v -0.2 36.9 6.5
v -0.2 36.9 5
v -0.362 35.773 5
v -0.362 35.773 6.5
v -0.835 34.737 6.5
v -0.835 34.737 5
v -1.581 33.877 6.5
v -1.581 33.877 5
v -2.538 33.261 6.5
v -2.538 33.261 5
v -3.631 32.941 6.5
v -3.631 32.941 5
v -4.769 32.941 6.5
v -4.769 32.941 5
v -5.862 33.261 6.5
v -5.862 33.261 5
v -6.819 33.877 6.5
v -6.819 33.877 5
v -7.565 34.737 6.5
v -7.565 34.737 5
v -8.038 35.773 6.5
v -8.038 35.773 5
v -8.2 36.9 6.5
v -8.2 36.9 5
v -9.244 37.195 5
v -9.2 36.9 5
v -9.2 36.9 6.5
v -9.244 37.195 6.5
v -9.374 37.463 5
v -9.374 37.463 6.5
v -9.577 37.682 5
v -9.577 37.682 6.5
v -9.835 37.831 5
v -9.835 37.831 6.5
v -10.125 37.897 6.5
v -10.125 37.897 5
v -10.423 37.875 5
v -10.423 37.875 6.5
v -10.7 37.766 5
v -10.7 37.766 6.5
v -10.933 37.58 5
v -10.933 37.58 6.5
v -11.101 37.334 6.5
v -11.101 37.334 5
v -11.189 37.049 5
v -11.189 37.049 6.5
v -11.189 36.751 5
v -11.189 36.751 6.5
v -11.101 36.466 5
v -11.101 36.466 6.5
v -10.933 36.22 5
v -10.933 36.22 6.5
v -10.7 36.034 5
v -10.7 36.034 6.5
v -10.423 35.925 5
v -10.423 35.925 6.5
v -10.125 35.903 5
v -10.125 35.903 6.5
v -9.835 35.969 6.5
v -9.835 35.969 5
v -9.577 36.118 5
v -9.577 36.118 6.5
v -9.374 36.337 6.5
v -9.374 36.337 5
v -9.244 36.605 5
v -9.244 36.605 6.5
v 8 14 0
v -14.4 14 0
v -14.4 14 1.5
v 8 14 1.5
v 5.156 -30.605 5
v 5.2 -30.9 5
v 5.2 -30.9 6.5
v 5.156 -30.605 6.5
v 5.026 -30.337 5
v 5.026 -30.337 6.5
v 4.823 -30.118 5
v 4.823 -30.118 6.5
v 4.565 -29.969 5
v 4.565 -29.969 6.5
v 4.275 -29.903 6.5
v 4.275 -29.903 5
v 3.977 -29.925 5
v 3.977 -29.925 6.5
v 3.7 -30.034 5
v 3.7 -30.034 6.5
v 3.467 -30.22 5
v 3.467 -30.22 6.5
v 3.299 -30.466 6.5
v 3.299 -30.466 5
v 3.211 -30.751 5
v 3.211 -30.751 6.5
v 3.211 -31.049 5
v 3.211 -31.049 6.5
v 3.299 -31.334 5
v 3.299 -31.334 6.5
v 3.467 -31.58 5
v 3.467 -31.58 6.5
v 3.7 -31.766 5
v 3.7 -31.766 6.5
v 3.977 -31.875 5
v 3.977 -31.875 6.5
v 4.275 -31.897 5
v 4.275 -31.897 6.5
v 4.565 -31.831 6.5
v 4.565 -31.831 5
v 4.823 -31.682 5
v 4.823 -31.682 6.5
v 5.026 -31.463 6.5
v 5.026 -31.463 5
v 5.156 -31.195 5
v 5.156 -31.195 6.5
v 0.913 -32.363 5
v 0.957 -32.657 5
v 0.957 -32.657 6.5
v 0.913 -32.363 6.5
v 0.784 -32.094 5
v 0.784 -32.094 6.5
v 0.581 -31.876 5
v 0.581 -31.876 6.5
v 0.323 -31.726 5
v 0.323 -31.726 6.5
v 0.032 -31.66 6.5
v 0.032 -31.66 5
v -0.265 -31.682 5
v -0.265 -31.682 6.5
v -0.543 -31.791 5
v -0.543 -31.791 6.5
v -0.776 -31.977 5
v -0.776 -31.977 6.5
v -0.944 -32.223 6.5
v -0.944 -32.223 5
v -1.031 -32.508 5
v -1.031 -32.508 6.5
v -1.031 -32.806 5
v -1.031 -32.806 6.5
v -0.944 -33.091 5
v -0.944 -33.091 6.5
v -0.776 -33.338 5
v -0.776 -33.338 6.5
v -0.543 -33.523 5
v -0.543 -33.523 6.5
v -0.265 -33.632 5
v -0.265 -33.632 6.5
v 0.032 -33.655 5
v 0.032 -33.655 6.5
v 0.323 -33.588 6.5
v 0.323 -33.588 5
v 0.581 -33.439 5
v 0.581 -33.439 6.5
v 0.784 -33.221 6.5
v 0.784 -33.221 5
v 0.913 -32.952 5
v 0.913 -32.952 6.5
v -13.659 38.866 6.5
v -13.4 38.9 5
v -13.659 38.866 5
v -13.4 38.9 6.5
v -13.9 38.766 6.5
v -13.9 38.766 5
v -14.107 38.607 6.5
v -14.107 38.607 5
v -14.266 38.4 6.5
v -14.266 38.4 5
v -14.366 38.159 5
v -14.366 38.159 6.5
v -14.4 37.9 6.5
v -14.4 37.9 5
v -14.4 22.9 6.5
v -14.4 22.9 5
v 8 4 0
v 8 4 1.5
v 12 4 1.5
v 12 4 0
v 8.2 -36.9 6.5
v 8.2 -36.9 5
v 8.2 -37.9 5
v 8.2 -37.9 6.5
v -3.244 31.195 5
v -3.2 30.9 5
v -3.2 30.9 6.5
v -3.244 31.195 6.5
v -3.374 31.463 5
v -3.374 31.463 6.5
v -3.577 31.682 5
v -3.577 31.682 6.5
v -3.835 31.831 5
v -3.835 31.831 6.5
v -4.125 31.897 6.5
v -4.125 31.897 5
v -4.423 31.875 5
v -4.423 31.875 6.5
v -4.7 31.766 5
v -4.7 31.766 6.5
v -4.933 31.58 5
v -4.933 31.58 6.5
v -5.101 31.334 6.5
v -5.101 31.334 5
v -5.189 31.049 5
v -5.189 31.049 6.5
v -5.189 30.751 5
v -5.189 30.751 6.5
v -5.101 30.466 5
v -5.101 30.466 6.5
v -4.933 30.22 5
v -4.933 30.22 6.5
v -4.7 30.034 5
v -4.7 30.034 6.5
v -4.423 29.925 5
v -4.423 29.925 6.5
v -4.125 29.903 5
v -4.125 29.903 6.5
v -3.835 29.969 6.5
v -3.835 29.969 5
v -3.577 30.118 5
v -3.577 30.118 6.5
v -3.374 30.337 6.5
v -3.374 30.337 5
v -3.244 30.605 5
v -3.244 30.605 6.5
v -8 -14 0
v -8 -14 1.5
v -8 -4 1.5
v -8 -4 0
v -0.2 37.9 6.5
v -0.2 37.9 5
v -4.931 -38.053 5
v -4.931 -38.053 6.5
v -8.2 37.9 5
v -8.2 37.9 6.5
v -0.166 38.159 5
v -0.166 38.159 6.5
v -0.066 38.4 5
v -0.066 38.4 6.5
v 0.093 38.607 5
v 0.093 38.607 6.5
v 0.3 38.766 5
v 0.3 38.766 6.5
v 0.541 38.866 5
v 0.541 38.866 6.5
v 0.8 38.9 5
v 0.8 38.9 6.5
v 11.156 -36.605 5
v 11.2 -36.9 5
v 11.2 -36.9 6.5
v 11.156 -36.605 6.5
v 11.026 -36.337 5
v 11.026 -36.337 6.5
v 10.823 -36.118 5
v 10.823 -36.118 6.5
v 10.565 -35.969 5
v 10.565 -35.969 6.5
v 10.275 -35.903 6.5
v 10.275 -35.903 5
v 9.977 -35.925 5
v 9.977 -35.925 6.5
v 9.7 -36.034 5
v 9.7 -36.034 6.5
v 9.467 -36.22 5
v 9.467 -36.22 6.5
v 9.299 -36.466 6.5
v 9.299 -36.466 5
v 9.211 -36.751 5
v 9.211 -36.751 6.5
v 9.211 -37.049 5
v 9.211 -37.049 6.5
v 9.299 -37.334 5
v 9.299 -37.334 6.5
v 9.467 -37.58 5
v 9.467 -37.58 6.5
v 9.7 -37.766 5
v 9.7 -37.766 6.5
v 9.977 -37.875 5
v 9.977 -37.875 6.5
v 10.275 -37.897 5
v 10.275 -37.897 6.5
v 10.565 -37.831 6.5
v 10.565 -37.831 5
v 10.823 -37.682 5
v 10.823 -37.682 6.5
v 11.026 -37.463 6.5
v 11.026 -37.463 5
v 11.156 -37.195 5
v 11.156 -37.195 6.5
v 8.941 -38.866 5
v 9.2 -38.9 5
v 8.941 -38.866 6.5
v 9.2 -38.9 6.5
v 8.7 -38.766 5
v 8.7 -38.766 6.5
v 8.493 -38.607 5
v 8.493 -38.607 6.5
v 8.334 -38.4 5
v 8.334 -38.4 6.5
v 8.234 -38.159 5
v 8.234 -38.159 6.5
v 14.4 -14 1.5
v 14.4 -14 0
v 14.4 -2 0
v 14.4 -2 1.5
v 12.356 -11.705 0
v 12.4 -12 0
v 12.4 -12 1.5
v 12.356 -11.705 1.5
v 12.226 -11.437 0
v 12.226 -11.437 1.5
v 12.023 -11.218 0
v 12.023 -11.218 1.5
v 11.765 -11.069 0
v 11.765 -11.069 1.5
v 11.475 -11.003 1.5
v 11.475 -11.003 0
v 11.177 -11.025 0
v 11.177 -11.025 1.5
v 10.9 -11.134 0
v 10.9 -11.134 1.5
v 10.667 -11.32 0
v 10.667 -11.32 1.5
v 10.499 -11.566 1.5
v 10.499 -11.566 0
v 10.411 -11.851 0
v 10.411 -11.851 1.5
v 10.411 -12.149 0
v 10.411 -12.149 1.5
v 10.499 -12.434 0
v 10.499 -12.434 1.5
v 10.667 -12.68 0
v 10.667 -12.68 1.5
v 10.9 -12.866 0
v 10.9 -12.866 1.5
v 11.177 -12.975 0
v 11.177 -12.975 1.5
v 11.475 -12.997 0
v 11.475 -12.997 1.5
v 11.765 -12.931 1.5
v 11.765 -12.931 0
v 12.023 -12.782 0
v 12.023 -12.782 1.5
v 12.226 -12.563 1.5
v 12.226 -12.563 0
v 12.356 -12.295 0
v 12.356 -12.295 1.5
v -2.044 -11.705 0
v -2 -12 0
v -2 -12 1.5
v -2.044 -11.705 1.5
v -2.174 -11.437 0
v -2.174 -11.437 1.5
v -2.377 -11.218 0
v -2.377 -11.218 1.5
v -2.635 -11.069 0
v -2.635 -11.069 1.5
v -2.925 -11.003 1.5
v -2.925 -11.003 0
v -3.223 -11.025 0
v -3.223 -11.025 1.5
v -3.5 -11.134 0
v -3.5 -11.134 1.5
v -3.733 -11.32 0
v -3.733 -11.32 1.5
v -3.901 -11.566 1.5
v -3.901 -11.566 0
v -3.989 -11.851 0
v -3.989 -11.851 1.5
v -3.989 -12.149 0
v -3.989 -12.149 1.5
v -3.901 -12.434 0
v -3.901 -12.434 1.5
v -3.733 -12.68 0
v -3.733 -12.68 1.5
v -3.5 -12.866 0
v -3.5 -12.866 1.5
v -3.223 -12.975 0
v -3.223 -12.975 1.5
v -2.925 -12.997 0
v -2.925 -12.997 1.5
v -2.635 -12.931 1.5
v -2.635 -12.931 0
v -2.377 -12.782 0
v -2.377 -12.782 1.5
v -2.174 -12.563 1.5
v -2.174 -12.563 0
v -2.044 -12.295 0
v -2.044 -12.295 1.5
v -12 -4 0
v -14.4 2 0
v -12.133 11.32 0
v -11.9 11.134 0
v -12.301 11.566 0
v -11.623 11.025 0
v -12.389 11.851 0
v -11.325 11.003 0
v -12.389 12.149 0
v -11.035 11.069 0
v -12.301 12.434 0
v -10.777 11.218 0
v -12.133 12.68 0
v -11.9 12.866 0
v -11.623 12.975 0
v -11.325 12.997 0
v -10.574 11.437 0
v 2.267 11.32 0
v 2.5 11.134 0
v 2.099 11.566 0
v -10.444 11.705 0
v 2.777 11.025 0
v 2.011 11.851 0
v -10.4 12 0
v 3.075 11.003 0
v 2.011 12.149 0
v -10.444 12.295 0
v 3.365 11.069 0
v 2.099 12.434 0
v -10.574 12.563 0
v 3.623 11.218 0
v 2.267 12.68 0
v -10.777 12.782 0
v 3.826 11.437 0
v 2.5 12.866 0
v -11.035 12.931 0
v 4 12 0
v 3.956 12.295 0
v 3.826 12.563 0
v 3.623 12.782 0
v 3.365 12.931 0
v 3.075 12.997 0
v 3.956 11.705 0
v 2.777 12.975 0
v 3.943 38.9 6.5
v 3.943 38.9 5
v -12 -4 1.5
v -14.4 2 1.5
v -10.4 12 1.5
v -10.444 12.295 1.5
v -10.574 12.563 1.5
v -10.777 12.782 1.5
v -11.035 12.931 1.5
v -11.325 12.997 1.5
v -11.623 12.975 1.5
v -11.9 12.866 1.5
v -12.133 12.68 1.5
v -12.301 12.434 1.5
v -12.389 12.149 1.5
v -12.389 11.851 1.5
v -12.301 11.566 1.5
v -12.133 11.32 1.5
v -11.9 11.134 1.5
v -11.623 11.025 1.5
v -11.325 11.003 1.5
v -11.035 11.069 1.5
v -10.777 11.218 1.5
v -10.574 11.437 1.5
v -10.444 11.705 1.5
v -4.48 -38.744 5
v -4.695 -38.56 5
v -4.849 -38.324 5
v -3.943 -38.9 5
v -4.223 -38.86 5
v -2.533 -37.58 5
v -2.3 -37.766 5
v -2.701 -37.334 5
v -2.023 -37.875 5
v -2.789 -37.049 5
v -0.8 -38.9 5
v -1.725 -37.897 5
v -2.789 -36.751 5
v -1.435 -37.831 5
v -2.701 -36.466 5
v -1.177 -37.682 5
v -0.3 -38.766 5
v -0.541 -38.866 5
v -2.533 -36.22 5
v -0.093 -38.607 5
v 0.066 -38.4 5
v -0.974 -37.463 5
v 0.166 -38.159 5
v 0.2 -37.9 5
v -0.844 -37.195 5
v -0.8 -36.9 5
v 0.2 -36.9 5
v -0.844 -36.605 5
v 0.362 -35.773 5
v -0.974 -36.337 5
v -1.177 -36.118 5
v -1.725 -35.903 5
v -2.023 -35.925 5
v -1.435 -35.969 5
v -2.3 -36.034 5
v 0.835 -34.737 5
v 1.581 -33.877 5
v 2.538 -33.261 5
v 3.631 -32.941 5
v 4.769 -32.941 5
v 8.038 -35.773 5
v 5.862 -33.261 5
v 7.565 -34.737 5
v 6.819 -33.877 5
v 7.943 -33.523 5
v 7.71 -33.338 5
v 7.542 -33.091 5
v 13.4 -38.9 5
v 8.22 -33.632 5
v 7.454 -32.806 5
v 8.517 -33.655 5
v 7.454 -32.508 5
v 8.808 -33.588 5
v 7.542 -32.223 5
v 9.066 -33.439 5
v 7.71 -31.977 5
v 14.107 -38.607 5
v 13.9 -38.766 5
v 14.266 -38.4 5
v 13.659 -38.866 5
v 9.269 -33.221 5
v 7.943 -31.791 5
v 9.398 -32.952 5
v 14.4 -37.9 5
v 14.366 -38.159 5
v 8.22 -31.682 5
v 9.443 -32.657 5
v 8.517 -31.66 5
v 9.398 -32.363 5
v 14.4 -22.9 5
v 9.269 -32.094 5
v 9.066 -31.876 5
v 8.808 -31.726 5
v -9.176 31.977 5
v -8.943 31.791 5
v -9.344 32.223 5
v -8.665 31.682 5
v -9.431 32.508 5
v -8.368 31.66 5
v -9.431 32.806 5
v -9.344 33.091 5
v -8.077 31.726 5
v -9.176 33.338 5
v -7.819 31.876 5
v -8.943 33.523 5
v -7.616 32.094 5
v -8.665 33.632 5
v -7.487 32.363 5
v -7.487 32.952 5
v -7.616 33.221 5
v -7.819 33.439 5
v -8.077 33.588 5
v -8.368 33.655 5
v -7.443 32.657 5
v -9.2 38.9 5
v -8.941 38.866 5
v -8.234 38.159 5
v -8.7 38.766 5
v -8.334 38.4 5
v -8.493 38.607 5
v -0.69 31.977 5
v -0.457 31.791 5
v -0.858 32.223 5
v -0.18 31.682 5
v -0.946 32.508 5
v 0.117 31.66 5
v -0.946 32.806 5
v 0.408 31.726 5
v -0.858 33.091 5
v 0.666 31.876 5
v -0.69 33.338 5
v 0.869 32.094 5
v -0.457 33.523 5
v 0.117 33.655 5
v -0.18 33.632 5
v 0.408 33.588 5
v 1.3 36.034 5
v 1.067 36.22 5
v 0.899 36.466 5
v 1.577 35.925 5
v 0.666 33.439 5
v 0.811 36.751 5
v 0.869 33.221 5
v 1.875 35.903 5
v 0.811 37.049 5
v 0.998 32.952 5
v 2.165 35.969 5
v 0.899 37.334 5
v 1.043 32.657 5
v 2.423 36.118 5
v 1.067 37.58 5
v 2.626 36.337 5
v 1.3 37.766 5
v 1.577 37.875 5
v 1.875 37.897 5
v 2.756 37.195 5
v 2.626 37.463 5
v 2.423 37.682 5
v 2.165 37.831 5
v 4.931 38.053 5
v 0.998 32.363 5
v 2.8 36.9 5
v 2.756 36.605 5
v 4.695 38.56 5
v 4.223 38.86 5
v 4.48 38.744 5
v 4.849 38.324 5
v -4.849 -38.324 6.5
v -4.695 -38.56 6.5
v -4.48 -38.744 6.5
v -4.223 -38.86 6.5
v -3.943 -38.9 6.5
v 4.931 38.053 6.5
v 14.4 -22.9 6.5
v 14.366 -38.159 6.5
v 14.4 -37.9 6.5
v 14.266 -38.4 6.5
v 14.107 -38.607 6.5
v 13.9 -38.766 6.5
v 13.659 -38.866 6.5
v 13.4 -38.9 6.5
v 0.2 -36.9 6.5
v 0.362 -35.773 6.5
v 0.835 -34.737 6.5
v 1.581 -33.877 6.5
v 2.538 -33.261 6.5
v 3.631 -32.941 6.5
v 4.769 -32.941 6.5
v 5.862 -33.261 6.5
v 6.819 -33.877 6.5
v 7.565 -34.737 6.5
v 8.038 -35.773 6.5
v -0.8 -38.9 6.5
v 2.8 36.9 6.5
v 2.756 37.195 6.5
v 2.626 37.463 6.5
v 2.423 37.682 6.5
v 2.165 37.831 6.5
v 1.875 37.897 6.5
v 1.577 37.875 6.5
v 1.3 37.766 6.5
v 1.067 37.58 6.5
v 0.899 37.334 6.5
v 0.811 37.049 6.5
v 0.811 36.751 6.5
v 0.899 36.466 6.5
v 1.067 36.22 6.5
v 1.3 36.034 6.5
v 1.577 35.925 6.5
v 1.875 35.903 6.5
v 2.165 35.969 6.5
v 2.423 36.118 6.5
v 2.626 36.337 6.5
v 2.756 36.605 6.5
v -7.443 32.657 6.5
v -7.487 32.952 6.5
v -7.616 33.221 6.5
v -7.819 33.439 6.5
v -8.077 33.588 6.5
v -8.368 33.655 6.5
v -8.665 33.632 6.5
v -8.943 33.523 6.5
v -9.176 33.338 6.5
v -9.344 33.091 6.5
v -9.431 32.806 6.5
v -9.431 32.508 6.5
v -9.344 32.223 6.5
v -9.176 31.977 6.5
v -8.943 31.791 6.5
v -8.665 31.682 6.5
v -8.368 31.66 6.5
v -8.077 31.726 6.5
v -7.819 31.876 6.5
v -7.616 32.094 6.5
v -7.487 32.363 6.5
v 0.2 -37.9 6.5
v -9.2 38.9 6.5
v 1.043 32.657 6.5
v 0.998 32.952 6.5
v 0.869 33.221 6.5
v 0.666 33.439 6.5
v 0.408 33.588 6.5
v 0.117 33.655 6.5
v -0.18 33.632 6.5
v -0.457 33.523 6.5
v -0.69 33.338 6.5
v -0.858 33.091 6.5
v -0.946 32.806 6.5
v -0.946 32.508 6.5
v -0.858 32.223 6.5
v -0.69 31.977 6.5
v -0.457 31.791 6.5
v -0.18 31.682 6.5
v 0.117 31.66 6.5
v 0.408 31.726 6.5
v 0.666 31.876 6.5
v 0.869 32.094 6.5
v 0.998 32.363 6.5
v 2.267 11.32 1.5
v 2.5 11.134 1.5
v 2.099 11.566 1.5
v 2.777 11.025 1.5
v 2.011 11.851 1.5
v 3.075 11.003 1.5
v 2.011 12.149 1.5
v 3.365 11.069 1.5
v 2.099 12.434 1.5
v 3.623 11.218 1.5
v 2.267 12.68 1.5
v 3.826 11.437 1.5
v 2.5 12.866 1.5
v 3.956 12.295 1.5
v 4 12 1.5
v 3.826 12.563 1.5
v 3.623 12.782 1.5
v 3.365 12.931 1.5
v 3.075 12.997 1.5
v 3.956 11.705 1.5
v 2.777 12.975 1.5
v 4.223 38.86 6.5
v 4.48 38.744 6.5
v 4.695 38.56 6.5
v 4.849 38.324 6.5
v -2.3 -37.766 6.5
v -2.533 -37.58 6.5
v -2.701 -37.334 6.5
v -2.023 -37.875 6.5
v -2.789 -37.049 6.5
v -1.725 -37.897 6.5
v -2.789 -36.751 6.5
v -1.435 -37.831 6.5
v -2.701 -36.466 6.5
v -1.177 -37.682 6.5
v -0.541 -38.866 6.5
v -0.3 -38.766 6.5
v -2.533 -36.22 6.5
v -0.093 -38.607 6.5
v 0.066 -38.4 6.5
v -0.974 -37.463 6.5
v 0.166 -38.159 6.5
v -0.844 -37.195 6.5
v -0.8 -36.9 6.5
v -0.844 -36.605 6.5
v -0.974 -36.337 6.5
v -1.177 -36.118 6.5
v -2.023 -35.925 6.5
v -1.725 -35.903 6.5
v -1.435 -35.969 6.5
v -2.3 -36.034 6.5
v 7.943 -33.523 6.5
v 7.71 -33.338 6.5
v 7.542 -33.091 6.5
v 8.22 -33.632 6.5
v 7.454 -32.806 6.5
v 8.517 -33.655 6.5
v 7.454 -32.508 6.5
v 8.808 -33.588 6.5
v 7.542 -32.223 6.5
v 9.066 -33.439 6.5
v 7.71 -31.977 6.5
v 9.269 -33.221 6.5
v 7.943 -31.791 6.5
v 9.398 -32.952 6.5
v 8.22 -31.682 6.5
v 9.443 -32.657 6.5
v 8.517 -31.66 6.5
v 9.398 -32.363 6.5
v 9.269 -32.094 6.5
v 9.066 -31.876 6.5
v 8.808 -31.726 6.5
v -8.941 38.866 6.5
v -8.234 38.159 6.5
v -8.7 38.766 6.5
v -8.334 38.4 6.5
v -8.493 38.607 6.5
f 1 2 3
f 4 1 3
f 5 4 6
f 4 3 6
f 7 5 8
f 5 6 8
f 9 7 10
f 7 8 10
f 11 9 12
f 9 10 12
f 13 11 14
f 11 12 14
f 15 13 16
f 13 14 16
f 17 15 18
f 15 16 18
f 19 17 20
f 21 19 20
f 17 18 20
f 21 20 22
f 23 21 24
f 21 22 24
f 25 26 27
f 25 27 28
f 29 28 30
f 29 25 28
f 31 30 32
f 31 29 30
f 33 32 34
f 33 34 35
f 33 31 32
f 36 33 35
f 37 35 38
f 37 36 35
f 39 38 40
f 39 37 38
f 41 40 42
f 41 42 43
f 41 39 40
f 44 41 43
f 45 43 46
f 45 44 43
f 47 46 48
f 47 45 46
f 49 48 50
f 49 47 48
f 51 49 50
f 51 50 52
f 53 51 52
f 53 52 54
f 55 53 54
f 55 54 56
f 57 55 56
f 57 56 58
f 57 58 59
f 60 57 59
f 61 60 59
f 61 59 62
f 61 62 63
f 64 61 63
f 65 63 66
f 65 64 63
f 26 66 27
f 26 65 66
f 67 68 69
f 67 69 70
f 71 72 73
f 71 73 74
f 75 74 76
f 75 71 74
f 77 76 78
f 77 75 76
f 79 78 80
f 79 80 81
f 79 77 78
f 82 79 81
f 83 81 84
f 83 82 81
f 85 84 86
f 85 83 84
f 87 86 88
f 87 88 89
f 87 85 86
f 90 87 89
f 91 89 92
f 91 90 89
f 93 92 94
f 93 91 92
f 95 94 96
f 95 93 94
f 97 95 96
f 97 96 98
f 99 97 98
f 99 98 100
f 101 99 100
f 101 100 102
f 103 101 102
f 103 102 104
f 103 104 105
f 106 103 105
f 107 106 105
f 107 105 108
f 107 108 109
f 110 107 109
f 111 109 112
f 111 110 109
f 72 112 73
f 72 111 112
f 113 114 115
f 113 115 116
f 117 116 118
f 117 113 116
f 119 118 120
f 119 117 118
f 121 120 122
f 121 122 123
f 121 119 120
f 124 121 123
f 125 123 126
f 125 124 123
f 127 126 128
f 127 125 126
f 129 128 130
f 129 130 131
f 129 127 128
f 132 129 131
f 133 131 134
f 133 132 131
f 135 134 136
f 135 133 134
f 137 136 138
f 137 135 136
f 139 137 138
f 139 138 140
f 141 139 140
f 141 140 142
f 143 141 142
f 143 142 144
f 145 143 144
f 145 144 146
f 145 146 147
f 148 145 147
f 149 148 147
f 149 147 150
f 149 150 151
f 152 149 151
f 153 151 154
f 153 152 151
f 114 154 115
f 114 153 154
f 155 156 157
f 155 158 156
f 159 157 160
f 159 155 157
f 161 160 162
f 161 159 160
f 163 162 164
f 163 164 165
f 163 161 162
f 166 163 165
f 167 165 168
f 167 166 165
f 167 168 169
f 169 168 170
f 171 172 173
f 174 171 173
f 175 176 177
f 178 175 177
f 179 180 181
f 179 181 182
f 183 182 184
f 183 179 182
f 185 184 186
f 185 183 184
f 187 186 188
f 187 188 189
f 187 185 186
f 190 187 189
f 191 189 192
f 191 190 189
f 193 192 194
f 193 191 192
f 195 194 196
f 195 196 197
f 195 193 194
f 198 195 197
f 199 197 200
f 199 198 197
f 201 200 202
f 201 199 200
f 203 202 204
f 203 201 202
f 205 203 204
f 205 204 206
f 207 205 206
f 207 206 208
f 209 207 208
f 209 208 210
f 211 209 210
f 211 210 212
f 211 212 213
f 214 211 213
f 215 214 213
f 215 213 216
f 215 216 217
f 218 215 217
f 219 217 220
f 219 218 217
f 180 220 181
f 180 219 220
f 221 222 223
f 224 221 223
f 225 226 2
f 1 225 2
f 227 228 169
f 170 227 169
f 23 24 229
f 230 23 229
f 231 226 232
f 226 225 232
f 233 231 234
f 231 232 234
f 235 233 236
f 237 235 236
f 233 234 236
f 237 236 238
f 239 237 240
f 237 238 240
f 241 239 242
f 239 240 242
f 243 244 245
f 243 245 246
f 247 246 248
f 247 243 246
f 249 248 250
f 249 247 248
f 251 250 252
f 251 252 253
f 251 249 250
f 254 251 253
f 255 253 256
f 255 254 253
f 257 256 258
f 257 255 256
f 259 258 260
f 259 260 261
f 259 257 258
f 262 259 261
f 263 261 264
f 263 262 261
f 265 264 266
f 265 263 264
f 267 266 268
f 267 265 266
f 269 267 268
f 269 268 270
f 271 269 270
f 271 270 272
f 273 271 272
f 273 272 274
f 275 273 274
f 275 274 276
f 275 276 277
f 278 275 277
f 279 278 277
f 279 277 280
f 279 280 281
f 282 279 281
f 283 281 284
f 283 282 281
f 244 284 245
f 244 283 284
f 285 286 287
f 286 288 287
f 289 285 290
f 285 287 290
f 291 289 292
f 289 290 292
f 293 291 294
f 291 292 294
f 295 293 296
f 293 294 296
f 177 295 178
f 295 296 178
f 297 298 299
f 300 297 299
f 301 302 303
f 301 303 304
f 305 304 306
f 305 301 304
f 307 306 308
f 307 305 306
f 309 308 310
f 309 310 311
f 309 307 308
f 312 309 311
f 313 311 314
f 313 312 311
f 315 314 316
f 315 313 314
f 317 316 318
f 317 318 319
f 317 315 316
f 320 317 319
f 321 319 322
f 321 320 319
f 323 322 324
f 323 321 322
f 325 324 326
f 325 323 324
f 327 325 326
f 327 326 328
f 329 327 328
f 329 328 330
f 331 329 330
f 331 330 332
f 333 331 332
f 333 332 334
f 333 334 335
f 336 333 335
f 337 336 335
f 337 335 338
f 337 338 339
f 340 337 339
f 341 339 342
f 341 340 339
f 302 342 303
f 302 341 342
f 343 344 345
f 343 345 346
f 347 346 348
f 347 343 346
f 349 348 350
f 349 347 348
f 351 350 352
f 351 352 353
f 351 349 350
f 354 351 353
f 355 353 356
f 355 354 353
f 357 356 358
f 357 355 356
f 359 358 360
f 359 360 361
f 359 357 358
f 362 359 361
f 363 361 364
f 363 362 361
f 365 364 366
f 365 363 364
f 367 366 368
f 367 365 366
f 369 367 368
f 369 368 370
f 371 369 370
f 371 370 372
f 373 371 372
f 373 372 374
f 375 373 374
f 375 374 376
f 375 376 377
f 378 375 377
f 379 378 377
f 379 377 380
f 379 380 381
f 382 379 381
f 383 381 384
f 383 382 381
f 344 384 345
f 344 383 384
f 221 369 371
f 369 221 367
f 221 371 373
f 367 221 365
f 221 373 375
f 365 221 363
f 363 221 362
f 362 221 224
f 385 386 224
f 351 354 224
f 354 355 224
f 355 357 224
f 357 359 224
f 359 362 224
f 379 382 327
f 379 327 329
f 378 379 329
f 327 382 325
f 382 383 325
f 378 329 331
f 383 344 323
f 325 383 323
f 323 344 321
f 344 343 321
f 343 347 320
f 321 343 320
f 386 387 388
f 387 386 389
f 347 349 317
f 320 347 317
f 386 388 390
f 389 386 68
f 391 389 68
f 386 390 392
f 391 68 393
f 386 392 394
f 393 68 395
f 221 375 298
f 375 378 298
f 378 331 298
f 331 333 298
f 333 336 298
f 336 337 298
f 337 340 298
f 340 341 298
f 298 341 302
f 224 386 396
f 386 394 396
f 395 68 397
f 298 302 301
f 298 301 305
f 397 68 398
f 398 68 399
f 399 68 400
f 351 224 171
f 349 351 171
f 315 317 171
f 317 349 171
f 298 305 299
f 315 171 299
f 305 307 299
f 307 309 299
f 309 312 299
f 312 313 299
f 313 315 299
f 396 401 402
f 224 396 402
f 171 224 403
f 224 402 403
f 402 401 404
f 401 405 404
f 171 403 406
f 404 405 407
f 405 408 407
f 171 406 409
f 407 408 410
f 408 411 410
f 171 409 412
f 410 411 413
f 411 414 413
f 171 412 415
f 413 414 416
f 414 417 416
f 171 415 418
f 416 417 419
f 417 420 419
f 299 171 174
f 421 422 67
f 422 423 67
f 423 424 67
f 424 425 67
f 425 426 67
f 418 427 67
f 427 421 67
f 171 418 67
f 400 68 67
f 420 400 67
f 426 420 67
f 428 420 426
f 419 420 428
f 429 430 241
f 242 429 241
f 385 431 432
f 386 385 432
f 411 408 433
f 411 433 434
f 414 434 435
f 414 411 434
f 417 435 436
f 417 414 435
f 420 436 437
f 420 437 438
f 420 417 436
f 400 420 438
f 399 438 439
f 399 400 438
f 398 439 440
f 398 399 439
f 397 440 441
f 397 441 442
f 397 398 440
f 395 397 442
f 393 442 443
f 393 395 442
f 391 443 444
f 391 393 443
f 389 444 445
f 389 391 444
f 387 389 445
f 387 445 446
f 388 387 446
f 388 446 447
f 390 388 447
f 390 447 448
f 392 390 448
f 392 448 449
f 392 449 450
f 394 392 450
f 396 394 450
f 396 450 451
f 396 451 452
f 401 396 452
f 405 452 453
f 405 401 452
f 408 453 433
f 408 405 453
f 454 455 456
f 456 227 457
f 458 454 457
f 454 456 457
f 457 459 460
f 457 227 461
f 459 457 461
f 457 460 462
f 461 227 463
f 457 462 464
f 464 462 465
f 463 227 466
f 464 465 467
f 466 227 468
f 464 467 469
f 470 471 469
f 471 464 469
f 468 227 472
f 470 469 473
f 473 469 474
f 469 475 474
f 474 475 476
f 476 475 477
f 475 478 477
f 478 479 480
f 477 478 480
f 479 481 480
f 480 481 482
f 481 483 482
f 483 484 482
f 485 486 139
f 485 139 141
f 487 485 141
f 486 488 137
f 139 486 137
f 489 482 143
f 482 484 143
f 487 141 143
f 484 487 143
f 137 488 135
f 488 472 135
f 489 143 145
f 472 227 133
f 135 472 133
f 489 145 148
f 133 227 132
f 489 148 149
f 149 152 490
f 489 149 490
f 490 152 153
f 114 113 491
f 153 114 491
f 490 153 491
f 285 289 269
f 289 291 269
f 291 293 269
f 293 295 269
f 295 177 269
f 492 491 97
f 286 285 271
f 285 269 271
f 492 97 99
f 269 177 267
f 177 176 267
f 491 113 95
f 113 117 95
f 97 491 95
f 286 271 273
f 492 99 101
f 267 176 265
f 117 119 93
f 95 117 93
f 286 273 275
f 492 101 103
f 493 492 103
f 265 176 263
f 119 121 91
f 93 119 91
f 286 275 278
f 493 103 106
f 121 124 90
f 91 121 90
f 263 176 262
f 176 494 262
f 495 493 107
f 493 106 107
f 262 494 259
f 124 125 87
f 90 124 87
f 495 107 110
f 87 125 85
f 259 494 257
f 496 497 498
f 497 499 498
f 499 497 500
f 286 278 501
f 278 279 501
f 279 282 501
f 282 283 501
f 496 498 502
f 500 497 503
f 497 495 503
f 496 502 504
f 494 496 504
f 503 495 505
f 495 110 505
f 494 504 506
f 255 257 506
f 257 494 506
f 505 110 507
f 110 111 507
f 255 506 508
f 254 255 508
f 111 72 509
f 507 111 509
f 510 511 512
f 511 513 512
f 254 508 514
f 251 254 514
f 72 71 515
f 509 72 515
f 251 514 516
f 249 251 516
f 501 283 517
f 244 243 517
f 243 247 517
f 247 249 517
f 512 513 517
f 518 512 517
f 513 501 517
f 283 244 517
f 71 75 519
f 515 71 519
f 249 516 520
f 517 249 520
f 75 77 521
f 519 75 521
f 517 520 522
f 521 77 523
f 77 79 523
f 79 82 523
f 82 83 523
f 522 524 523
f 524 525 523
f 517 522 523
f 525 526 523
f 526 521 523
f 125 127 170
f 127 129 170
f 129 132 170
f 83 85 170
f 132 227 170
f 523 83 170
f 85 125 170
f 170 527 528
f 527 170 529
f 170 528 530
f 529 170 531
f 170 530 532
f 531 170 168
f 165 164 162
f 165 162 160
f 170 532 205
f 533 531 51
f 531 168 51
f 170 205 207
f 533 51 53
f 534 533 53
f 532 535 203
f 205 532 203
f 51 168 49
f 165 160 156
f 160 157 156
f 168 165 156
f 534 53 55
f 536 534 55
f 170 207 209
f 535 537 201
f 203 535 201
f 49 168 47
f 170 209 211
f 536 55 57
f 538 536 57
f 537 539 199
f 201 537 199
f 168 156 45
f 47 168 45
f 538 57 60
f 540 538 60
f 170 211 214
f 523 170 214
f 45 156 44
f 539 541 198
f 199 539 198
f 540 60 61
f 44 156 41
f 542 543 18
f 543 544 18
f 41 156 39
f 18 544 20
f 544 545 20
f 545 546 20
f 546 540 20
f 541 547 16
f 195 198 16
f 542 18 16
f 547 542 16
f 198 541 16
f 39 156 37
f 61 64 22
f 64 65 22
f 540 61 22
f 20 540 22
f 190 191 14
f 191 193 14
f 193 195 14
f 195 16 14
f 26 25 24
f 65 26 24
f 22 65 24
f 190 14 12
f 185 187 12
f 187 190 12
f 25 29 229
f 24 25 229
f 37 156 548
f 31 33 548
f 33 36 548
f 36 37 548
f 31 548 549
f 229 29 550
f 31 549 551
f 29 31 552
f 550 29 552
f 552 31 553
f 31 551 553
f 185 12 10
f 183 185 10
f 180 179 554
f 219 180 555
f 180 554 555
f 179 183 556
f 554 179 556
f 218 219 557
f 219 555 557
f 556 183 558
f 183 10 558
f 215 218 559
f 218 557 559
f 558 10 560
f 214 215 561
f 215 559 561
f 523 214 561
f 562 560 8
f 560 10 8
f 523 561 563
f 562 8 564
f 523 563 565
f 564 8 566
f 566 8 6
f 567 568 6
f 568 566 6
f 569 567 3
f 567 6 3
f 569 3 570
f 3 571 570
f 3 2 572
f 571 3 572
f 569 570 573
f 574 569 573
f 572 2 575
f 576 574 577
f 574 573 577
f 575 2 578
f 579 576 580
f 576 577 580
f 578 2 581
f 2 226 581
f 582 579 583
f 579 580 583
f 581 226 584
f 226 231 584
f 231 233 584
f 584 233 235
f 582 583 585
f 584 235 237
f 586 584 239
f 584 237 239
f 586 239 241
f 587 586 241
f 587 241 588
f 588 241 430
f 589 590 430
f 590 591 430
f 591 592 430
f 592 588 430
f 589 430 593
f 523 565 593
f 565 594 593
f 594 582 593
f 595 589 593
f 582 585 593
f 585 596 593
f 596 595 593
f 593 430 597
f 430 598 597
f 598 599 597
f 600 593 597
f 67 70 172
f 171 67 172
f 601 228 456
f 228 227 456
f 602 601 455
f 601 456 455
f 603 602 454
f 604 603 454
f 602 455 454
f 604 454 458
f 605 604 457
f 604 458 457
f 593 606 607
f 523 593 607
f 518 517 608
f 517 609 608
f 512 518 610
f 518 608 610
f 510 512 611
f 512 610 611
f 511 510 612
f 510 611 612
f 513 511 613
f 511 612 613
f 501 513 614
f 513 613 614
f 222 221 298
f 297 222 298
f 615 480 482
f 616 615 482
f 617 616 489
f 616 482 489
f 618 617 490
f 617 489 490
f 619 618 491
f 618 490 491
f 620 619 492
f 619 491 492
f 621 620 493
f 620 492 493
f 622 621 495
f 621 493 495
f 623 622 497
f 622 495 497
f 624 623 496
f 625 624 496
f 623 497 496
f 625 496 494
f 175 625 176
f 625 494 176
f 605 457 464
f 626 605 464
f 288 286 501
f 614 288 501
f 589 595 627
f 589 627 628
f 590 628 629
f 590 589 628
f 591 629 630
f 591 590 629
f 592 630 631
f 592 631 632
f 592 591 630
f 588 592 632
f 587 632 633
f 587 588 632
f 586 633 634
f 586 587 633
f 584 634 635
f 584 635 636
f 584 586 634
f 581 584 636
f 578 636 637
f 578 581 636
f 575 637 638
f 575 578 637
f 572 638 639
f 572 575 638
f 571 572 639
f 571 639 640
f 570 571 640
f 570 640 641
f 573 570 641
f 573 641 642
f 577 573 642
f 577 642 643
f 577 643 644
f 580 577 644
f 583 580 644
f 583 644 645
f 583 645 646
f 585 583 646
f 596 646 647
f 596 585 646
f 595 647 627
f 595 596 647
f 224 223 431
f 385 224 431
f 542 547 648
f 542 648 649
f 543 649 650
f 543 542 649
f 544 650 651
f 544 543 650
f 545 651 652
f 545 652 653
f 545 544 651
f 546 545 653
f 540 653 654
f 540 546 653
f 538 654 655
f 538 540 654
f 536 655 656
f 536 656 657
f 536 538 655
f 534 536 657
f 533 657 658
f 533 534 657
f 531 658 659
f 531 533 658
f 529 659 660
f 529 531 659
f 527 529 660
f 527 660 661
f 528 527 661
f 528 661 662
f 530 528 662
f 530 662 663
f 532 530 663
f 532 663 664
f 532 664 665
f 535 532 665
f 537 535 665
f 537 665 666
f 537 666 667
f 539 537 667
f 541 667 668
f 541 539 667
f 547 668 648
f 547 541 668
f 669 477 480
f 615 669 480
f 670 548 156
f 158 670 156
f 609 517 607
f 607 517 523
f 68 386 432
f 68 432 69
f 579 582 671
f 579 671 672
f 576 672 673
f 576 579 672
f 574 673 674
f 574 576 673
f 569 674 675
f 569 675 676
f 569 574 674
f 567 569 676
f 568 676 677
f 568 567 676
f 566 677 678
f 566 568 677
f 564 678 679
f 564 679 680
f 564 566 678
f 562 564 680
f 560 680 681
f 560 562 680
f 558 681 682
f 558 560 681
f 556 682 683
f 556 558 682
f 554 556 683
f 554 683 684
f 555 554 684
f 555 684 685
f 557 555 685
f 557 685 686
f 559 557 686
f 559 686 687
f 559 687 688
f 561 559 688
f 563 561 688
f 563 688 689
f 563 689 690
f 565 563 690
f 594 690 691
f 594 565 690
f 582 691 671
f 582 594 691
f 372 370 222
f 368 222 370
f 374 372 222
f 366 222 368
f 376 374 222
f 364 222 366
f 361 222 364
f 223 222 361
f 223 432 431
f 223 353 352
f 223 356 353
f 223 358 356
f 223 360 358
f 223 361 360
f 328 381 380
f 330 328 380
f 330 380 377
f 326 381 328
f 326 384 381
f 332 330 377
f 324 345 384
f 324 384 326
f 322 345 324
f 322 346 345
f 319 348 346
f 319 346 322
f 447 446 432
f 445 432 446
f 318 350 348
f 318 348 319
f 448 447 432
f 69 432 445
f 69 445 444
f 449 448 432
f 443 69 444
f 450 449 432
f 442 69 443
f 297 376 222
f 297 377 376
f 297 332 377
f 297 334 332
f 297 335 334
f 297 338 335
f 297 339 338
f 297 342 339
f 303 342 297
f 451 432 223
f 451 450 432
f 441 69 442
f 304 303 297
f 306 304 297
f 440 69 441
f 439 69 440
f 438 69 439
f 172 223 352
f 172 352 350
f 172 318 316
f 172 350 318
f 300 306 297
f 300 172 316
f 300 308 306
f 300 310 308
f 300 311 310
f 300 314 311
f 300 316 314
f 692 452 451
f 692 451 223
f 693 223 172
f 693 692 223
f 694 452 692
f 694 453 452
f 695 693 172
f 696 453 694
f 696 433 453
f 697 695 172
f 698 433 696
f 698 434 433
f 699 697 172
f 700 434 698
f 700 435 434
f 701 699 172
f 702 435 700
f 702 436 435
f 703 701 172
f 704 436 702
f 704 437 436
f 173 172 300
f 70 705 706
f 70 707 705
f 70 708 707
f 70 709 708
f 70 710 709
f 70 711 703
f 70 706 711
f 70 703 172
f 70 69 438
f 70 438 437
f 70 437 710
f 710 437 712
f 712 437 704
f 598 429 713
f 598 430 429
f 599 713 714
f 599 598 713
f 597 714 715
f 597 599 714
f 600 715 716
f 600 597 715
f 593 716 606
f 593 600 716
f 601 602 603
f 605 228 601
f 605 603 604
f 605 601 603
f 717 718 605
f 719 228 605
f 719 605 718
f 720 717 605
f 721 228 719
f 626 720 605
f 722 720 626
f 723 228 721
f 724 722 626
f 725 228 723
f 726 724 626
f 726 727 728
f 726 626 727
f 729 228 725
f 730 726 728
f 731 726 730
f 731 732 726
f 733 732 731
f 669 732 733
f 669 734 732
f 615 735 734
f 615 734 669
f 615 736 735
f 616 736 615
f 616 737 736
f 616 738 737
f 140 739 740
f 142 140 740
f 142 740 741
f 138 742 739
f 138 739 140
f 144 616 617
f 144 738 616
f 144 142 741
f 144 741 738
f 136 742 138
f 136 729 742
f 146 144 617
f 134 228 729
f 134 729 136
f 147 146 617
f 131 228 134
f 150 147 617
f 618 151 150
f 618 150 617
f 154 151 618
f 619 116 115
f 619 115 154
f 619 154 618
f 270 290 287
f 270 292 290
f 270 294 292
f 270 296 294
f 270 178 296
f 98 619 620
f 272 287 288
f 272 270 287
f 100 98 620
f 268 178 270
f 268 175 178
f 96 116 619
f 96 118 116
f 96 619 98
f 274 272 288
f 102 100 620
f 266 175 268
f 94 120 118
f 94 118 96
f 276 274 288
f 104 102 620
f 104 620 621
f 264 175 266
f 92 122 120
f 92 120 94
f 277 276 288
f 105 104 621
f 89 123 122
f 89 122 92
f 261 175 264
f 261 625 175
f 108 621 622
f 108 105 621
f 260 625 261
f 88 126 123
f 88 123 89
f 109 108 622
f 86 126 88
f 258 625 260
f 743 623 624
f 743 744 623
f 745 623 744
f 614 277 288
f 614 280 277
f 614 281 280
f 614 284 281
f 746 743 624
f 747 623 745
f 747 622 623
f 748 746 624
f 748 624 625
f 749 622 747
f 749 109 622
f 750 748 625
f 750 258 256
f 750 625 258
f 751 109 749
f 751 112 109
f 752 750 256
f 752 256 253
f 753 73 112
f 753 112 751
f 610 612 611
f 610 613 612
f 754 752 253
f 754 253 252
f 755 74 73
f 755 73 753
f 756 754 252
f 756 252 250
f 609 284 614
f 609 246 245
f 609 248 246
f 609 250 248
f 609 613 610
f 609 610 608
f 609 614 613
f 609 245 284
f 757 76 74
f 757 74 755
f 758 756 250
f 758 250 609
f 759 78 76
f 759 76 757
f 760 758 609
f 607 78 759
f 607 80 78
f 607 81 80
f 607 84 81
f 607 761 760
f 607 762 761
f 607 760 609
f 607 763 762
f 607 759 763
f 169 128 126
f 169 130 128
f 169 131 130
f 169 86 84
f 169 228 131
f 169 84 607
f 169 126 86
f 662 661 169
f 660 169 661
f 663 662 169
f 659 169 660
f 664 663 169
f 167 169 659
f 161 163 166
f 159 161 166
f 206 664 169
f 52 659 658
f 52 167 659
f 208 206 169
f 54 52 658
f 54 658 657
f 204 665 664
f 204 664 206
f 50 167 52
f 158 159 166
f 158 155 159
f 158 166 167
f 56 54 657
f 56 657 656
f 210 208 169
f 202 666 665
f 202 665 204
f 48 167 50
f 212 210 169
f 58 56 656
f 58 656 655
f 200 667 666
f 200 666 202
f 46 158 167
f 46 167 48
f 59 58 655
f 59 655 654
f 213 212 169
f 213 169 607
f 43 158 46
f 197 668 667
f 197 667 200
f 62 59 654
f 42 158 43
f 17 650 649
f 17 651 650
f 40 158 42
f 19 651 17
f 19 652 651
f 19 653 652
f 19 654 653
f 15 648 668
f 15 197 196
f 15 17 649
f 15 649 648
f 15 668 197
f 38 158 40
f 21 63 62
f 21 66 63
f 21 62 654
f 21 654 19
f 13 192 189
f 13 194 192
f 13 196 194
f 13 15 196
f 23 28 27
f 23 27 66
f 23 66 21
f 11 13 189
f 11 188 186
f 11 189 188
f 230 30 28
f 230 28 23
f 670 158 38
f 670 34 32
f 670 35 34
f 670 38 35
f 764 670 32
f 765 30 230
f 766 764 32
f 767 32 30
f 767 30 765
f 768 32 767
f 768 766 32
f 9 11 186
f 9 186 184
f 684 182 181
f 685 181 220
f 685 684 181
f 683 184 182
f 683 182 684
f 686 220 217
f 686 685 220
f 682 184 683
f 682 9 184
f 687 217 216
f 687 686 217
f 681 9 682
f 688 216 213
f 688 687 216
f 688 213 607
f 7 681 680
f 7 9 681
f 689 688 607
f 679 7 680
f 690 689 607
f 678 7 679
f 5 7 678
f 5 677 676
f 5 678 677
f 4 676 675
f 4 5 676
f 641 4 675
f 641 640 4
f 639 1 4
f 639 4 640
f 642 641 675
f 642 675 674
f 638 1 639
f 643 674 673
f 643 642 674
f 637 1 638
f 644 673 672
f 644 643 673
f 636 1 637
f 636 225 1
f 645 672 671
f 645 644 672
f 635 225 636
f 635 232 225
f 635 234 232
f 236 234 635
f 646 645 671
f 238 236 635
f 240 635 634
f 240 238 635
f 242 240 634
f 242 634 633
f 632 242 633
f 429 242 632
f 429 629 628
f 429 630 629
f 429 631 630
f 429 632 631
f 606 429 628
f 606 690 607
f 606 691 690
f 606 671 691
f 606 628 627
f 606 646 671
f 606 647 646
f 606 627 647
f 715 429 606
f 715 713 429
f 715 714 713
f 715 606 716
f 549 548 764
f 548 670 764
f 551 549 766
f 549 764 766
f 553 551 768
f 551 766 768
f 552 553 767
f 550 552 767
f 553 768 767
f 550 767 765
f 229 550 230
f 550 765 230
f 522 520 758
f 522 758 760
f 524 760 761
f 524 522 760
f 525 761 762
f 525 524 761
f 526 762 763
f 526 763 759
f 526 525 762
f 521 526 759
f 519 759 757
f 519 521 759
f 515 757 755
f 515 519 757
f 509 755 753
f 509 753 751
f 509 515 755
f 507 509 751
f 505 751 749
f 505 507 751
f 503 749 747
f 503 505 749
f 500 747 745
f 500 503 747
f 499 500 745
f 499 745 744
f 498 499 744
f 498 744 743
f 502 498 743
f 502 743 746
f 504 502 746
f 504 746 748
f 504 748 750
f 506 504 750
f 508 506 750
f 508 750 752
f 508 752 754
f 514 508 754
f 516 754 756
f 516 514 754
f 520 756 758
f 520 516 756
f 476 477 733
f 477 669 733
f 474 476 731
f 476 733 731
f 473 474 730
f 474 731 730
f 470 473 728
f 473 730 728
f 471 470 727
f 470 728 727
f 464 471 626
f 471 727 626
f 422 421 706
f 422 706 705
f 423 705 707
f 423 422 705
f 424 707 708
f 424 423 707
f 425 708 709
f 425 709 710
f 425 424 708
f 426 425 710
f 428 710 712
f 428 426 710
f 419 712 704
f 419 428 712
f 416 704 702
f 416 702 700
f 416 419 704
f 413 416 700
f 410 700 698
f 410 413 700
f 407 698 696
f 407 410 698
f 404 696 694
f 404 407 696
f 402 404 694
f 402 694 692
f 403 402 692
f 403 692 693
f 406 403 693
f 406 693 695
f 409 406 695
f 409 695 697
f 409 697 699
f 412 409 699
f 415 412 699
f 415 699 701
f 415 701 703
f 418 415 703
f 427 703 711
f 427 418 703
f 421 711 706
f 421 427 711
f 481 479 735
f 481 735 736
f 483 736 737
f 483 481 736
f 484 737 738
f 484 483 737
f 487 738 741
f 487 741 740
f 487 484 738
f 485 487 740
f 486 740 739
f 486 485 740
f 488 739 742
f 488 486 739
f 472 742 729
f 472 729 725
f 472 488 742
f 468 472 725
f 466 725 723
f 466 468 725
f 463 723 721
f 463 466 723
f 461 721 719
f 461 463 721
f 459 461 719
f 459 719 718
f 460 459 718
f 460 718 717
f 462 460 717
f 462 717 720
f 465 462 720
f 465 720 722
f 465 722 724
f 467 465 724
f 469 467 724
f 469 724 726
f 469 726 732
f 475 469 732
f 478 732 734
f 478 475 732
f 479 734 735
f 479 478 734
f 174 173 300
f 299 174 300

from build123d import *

# Parameters (mm, degrees)
F0_W     = 28.8
F0_H     = 28
F0_R     = 1
F1_DEPTH = 1.5
F3_DEPTH = 1.5
F5_R     = 1
F6_DEPTH = 1.5
F8_DEPTH = 1.5
F9_R     = 1


with BuildPart() as f1:
    # F0 (on Top) → F1 (new body)
    with BuildSketch(Plane.XY):
        Rectangle(F0_W, F0_H)
        with Locations((-3, -12)):
            Circle(F0_R, mode=Mode.SUBTRACT)
        with Locations((11.4, -12)):
            Circle(F0_R, mode=Mode.SUBTRACT)
        with Locations((-11.4, 12)):
            Circle(F0_R, mode=Mode.SUBTRACT)
        with Locations((3, 12)):
            Circle(F0_R, mode=Mode.SUBTRACT)
    extrude(amount=F1_DEPTH)

    # F2 (on face) → F3 (cut, through all)
    with BuildSketch(Plane.XY.offset(1.5)):
        Polygon((-12, -4), (-14.4, 2), (-14.4, -14), (-8, -14), (-8, -4), align=None)
        Polygon((14.4, -2), (14.4, 14), (8, 14), (8, 4), (12, 4), align=None)
    extrude(amount=-F3_DEPTH, mode=Mode.SUBTRACT)


with BuildPart() as f6:
    # F5 (on offset) → F6 (new body)
    with BuildSketch(Plane.XY.offset(5)):
        with BuildLine():
            Line((-8.2, 38.9), (-14.4, 38.9))
            Line((-14.4, 38.9), (-14.4, -38.9))
            Line((-14.4, -38.9), (0.2, -38.9))
            Line((0.2, -38.9), (0.2, -36.9))
            ThreePointArc((0.2, -36.9), (4.2, -32.9), (8.2, -36.9))
            Line((8.2, -36.9), (8.2, -38.9))
            Line((8.2, -38.9), (14.4, -38.9))
            Line((14.4, -38.9), (14.4, 38.9))
            Line((14.4, 38.9), (-0.2, 38.9))
            Line((-0.2, 38.9), (-0.2, 36.9))
            ThreePointArc((-0.2, 36.9), (-4.2, 32.9), (-8.2, 36.9))
            Line((-8.2, 36.9), (-8.2, 38.9))
        make_face()
        with Locations((-1.8, -36.9)):
            Circle(F5_R, mode=Mode.SUBTRACT)
        with Locations((-0.0426406871, -32.6573593129)):
            Circle(F5_R, mode=Mode.SUBTRACT)
        with Locations((4.2, -30.9)):
            Circle(F5_R, mode=Mode.SUBTRACT)
        with Locations((10.2, -36.9)):
            Circle(F5_R, mode=Mode.SUBTRACT)
        with Locations((8.4426406871, -32.6573593129)):
            Circle(F5_R, mode=Mode.SUBTRACT)
        with Locations((-8.4426406871, 32.6573593129)):
            Circle(F5_R, mode=Mode.SUBTRACT)
        with Locations((-10.2, 36.9)):
            Circle(F5_R, mode=Mode.SUBTRACT)
        with Locations((-4.2, 30.9)):
            Circle(F5_R, mode=Mode.SUBTRACT)
        with Locations((0.0426406871, 32.6573593129)):
            Circle(F5_R, mode=Mode.SUBTRACT)
        with Locations((1.8, 36.9)):
            Circle(F5_R, mode=Mode.SUBTRACT)
    extrude(amount=F6_DEPTH)

    # F7 (on face) → F8 (cut, through all)
    with BuildSketch(Plane.XY.offset(6.5)):
        Polygon((-4.8, -38.9), (-14.4, 22.9), (-14.4, -38.9), align=None)
        Polygon((4.8, 38.9), (14.4, -22.9), (14.4, 38.9), align=None)
    extrude(amount=-F8_DEPTH, mode=Mode.SUBTRACT)

    # F9
    f9_edges = [f6.edges().sort_by_distance(p)[0] for p in [
        (-4.8, -38.9, 5.75),
        (0.2, -38.9, 5.75),
        (8.2, -38.9, 5.75),
        (14.4, -38.9, 5.75),
        (4.8, 38.9, 5.75),
        (-0.2, 38.9, 5.75),
        (-8.2, 38.9, 5.75),
        (-14.4, 38.9, 5.75),
    ]]
    fillet(f9_edges, radius=F9_R)


solid = Compound([f1.part, f6.part])
